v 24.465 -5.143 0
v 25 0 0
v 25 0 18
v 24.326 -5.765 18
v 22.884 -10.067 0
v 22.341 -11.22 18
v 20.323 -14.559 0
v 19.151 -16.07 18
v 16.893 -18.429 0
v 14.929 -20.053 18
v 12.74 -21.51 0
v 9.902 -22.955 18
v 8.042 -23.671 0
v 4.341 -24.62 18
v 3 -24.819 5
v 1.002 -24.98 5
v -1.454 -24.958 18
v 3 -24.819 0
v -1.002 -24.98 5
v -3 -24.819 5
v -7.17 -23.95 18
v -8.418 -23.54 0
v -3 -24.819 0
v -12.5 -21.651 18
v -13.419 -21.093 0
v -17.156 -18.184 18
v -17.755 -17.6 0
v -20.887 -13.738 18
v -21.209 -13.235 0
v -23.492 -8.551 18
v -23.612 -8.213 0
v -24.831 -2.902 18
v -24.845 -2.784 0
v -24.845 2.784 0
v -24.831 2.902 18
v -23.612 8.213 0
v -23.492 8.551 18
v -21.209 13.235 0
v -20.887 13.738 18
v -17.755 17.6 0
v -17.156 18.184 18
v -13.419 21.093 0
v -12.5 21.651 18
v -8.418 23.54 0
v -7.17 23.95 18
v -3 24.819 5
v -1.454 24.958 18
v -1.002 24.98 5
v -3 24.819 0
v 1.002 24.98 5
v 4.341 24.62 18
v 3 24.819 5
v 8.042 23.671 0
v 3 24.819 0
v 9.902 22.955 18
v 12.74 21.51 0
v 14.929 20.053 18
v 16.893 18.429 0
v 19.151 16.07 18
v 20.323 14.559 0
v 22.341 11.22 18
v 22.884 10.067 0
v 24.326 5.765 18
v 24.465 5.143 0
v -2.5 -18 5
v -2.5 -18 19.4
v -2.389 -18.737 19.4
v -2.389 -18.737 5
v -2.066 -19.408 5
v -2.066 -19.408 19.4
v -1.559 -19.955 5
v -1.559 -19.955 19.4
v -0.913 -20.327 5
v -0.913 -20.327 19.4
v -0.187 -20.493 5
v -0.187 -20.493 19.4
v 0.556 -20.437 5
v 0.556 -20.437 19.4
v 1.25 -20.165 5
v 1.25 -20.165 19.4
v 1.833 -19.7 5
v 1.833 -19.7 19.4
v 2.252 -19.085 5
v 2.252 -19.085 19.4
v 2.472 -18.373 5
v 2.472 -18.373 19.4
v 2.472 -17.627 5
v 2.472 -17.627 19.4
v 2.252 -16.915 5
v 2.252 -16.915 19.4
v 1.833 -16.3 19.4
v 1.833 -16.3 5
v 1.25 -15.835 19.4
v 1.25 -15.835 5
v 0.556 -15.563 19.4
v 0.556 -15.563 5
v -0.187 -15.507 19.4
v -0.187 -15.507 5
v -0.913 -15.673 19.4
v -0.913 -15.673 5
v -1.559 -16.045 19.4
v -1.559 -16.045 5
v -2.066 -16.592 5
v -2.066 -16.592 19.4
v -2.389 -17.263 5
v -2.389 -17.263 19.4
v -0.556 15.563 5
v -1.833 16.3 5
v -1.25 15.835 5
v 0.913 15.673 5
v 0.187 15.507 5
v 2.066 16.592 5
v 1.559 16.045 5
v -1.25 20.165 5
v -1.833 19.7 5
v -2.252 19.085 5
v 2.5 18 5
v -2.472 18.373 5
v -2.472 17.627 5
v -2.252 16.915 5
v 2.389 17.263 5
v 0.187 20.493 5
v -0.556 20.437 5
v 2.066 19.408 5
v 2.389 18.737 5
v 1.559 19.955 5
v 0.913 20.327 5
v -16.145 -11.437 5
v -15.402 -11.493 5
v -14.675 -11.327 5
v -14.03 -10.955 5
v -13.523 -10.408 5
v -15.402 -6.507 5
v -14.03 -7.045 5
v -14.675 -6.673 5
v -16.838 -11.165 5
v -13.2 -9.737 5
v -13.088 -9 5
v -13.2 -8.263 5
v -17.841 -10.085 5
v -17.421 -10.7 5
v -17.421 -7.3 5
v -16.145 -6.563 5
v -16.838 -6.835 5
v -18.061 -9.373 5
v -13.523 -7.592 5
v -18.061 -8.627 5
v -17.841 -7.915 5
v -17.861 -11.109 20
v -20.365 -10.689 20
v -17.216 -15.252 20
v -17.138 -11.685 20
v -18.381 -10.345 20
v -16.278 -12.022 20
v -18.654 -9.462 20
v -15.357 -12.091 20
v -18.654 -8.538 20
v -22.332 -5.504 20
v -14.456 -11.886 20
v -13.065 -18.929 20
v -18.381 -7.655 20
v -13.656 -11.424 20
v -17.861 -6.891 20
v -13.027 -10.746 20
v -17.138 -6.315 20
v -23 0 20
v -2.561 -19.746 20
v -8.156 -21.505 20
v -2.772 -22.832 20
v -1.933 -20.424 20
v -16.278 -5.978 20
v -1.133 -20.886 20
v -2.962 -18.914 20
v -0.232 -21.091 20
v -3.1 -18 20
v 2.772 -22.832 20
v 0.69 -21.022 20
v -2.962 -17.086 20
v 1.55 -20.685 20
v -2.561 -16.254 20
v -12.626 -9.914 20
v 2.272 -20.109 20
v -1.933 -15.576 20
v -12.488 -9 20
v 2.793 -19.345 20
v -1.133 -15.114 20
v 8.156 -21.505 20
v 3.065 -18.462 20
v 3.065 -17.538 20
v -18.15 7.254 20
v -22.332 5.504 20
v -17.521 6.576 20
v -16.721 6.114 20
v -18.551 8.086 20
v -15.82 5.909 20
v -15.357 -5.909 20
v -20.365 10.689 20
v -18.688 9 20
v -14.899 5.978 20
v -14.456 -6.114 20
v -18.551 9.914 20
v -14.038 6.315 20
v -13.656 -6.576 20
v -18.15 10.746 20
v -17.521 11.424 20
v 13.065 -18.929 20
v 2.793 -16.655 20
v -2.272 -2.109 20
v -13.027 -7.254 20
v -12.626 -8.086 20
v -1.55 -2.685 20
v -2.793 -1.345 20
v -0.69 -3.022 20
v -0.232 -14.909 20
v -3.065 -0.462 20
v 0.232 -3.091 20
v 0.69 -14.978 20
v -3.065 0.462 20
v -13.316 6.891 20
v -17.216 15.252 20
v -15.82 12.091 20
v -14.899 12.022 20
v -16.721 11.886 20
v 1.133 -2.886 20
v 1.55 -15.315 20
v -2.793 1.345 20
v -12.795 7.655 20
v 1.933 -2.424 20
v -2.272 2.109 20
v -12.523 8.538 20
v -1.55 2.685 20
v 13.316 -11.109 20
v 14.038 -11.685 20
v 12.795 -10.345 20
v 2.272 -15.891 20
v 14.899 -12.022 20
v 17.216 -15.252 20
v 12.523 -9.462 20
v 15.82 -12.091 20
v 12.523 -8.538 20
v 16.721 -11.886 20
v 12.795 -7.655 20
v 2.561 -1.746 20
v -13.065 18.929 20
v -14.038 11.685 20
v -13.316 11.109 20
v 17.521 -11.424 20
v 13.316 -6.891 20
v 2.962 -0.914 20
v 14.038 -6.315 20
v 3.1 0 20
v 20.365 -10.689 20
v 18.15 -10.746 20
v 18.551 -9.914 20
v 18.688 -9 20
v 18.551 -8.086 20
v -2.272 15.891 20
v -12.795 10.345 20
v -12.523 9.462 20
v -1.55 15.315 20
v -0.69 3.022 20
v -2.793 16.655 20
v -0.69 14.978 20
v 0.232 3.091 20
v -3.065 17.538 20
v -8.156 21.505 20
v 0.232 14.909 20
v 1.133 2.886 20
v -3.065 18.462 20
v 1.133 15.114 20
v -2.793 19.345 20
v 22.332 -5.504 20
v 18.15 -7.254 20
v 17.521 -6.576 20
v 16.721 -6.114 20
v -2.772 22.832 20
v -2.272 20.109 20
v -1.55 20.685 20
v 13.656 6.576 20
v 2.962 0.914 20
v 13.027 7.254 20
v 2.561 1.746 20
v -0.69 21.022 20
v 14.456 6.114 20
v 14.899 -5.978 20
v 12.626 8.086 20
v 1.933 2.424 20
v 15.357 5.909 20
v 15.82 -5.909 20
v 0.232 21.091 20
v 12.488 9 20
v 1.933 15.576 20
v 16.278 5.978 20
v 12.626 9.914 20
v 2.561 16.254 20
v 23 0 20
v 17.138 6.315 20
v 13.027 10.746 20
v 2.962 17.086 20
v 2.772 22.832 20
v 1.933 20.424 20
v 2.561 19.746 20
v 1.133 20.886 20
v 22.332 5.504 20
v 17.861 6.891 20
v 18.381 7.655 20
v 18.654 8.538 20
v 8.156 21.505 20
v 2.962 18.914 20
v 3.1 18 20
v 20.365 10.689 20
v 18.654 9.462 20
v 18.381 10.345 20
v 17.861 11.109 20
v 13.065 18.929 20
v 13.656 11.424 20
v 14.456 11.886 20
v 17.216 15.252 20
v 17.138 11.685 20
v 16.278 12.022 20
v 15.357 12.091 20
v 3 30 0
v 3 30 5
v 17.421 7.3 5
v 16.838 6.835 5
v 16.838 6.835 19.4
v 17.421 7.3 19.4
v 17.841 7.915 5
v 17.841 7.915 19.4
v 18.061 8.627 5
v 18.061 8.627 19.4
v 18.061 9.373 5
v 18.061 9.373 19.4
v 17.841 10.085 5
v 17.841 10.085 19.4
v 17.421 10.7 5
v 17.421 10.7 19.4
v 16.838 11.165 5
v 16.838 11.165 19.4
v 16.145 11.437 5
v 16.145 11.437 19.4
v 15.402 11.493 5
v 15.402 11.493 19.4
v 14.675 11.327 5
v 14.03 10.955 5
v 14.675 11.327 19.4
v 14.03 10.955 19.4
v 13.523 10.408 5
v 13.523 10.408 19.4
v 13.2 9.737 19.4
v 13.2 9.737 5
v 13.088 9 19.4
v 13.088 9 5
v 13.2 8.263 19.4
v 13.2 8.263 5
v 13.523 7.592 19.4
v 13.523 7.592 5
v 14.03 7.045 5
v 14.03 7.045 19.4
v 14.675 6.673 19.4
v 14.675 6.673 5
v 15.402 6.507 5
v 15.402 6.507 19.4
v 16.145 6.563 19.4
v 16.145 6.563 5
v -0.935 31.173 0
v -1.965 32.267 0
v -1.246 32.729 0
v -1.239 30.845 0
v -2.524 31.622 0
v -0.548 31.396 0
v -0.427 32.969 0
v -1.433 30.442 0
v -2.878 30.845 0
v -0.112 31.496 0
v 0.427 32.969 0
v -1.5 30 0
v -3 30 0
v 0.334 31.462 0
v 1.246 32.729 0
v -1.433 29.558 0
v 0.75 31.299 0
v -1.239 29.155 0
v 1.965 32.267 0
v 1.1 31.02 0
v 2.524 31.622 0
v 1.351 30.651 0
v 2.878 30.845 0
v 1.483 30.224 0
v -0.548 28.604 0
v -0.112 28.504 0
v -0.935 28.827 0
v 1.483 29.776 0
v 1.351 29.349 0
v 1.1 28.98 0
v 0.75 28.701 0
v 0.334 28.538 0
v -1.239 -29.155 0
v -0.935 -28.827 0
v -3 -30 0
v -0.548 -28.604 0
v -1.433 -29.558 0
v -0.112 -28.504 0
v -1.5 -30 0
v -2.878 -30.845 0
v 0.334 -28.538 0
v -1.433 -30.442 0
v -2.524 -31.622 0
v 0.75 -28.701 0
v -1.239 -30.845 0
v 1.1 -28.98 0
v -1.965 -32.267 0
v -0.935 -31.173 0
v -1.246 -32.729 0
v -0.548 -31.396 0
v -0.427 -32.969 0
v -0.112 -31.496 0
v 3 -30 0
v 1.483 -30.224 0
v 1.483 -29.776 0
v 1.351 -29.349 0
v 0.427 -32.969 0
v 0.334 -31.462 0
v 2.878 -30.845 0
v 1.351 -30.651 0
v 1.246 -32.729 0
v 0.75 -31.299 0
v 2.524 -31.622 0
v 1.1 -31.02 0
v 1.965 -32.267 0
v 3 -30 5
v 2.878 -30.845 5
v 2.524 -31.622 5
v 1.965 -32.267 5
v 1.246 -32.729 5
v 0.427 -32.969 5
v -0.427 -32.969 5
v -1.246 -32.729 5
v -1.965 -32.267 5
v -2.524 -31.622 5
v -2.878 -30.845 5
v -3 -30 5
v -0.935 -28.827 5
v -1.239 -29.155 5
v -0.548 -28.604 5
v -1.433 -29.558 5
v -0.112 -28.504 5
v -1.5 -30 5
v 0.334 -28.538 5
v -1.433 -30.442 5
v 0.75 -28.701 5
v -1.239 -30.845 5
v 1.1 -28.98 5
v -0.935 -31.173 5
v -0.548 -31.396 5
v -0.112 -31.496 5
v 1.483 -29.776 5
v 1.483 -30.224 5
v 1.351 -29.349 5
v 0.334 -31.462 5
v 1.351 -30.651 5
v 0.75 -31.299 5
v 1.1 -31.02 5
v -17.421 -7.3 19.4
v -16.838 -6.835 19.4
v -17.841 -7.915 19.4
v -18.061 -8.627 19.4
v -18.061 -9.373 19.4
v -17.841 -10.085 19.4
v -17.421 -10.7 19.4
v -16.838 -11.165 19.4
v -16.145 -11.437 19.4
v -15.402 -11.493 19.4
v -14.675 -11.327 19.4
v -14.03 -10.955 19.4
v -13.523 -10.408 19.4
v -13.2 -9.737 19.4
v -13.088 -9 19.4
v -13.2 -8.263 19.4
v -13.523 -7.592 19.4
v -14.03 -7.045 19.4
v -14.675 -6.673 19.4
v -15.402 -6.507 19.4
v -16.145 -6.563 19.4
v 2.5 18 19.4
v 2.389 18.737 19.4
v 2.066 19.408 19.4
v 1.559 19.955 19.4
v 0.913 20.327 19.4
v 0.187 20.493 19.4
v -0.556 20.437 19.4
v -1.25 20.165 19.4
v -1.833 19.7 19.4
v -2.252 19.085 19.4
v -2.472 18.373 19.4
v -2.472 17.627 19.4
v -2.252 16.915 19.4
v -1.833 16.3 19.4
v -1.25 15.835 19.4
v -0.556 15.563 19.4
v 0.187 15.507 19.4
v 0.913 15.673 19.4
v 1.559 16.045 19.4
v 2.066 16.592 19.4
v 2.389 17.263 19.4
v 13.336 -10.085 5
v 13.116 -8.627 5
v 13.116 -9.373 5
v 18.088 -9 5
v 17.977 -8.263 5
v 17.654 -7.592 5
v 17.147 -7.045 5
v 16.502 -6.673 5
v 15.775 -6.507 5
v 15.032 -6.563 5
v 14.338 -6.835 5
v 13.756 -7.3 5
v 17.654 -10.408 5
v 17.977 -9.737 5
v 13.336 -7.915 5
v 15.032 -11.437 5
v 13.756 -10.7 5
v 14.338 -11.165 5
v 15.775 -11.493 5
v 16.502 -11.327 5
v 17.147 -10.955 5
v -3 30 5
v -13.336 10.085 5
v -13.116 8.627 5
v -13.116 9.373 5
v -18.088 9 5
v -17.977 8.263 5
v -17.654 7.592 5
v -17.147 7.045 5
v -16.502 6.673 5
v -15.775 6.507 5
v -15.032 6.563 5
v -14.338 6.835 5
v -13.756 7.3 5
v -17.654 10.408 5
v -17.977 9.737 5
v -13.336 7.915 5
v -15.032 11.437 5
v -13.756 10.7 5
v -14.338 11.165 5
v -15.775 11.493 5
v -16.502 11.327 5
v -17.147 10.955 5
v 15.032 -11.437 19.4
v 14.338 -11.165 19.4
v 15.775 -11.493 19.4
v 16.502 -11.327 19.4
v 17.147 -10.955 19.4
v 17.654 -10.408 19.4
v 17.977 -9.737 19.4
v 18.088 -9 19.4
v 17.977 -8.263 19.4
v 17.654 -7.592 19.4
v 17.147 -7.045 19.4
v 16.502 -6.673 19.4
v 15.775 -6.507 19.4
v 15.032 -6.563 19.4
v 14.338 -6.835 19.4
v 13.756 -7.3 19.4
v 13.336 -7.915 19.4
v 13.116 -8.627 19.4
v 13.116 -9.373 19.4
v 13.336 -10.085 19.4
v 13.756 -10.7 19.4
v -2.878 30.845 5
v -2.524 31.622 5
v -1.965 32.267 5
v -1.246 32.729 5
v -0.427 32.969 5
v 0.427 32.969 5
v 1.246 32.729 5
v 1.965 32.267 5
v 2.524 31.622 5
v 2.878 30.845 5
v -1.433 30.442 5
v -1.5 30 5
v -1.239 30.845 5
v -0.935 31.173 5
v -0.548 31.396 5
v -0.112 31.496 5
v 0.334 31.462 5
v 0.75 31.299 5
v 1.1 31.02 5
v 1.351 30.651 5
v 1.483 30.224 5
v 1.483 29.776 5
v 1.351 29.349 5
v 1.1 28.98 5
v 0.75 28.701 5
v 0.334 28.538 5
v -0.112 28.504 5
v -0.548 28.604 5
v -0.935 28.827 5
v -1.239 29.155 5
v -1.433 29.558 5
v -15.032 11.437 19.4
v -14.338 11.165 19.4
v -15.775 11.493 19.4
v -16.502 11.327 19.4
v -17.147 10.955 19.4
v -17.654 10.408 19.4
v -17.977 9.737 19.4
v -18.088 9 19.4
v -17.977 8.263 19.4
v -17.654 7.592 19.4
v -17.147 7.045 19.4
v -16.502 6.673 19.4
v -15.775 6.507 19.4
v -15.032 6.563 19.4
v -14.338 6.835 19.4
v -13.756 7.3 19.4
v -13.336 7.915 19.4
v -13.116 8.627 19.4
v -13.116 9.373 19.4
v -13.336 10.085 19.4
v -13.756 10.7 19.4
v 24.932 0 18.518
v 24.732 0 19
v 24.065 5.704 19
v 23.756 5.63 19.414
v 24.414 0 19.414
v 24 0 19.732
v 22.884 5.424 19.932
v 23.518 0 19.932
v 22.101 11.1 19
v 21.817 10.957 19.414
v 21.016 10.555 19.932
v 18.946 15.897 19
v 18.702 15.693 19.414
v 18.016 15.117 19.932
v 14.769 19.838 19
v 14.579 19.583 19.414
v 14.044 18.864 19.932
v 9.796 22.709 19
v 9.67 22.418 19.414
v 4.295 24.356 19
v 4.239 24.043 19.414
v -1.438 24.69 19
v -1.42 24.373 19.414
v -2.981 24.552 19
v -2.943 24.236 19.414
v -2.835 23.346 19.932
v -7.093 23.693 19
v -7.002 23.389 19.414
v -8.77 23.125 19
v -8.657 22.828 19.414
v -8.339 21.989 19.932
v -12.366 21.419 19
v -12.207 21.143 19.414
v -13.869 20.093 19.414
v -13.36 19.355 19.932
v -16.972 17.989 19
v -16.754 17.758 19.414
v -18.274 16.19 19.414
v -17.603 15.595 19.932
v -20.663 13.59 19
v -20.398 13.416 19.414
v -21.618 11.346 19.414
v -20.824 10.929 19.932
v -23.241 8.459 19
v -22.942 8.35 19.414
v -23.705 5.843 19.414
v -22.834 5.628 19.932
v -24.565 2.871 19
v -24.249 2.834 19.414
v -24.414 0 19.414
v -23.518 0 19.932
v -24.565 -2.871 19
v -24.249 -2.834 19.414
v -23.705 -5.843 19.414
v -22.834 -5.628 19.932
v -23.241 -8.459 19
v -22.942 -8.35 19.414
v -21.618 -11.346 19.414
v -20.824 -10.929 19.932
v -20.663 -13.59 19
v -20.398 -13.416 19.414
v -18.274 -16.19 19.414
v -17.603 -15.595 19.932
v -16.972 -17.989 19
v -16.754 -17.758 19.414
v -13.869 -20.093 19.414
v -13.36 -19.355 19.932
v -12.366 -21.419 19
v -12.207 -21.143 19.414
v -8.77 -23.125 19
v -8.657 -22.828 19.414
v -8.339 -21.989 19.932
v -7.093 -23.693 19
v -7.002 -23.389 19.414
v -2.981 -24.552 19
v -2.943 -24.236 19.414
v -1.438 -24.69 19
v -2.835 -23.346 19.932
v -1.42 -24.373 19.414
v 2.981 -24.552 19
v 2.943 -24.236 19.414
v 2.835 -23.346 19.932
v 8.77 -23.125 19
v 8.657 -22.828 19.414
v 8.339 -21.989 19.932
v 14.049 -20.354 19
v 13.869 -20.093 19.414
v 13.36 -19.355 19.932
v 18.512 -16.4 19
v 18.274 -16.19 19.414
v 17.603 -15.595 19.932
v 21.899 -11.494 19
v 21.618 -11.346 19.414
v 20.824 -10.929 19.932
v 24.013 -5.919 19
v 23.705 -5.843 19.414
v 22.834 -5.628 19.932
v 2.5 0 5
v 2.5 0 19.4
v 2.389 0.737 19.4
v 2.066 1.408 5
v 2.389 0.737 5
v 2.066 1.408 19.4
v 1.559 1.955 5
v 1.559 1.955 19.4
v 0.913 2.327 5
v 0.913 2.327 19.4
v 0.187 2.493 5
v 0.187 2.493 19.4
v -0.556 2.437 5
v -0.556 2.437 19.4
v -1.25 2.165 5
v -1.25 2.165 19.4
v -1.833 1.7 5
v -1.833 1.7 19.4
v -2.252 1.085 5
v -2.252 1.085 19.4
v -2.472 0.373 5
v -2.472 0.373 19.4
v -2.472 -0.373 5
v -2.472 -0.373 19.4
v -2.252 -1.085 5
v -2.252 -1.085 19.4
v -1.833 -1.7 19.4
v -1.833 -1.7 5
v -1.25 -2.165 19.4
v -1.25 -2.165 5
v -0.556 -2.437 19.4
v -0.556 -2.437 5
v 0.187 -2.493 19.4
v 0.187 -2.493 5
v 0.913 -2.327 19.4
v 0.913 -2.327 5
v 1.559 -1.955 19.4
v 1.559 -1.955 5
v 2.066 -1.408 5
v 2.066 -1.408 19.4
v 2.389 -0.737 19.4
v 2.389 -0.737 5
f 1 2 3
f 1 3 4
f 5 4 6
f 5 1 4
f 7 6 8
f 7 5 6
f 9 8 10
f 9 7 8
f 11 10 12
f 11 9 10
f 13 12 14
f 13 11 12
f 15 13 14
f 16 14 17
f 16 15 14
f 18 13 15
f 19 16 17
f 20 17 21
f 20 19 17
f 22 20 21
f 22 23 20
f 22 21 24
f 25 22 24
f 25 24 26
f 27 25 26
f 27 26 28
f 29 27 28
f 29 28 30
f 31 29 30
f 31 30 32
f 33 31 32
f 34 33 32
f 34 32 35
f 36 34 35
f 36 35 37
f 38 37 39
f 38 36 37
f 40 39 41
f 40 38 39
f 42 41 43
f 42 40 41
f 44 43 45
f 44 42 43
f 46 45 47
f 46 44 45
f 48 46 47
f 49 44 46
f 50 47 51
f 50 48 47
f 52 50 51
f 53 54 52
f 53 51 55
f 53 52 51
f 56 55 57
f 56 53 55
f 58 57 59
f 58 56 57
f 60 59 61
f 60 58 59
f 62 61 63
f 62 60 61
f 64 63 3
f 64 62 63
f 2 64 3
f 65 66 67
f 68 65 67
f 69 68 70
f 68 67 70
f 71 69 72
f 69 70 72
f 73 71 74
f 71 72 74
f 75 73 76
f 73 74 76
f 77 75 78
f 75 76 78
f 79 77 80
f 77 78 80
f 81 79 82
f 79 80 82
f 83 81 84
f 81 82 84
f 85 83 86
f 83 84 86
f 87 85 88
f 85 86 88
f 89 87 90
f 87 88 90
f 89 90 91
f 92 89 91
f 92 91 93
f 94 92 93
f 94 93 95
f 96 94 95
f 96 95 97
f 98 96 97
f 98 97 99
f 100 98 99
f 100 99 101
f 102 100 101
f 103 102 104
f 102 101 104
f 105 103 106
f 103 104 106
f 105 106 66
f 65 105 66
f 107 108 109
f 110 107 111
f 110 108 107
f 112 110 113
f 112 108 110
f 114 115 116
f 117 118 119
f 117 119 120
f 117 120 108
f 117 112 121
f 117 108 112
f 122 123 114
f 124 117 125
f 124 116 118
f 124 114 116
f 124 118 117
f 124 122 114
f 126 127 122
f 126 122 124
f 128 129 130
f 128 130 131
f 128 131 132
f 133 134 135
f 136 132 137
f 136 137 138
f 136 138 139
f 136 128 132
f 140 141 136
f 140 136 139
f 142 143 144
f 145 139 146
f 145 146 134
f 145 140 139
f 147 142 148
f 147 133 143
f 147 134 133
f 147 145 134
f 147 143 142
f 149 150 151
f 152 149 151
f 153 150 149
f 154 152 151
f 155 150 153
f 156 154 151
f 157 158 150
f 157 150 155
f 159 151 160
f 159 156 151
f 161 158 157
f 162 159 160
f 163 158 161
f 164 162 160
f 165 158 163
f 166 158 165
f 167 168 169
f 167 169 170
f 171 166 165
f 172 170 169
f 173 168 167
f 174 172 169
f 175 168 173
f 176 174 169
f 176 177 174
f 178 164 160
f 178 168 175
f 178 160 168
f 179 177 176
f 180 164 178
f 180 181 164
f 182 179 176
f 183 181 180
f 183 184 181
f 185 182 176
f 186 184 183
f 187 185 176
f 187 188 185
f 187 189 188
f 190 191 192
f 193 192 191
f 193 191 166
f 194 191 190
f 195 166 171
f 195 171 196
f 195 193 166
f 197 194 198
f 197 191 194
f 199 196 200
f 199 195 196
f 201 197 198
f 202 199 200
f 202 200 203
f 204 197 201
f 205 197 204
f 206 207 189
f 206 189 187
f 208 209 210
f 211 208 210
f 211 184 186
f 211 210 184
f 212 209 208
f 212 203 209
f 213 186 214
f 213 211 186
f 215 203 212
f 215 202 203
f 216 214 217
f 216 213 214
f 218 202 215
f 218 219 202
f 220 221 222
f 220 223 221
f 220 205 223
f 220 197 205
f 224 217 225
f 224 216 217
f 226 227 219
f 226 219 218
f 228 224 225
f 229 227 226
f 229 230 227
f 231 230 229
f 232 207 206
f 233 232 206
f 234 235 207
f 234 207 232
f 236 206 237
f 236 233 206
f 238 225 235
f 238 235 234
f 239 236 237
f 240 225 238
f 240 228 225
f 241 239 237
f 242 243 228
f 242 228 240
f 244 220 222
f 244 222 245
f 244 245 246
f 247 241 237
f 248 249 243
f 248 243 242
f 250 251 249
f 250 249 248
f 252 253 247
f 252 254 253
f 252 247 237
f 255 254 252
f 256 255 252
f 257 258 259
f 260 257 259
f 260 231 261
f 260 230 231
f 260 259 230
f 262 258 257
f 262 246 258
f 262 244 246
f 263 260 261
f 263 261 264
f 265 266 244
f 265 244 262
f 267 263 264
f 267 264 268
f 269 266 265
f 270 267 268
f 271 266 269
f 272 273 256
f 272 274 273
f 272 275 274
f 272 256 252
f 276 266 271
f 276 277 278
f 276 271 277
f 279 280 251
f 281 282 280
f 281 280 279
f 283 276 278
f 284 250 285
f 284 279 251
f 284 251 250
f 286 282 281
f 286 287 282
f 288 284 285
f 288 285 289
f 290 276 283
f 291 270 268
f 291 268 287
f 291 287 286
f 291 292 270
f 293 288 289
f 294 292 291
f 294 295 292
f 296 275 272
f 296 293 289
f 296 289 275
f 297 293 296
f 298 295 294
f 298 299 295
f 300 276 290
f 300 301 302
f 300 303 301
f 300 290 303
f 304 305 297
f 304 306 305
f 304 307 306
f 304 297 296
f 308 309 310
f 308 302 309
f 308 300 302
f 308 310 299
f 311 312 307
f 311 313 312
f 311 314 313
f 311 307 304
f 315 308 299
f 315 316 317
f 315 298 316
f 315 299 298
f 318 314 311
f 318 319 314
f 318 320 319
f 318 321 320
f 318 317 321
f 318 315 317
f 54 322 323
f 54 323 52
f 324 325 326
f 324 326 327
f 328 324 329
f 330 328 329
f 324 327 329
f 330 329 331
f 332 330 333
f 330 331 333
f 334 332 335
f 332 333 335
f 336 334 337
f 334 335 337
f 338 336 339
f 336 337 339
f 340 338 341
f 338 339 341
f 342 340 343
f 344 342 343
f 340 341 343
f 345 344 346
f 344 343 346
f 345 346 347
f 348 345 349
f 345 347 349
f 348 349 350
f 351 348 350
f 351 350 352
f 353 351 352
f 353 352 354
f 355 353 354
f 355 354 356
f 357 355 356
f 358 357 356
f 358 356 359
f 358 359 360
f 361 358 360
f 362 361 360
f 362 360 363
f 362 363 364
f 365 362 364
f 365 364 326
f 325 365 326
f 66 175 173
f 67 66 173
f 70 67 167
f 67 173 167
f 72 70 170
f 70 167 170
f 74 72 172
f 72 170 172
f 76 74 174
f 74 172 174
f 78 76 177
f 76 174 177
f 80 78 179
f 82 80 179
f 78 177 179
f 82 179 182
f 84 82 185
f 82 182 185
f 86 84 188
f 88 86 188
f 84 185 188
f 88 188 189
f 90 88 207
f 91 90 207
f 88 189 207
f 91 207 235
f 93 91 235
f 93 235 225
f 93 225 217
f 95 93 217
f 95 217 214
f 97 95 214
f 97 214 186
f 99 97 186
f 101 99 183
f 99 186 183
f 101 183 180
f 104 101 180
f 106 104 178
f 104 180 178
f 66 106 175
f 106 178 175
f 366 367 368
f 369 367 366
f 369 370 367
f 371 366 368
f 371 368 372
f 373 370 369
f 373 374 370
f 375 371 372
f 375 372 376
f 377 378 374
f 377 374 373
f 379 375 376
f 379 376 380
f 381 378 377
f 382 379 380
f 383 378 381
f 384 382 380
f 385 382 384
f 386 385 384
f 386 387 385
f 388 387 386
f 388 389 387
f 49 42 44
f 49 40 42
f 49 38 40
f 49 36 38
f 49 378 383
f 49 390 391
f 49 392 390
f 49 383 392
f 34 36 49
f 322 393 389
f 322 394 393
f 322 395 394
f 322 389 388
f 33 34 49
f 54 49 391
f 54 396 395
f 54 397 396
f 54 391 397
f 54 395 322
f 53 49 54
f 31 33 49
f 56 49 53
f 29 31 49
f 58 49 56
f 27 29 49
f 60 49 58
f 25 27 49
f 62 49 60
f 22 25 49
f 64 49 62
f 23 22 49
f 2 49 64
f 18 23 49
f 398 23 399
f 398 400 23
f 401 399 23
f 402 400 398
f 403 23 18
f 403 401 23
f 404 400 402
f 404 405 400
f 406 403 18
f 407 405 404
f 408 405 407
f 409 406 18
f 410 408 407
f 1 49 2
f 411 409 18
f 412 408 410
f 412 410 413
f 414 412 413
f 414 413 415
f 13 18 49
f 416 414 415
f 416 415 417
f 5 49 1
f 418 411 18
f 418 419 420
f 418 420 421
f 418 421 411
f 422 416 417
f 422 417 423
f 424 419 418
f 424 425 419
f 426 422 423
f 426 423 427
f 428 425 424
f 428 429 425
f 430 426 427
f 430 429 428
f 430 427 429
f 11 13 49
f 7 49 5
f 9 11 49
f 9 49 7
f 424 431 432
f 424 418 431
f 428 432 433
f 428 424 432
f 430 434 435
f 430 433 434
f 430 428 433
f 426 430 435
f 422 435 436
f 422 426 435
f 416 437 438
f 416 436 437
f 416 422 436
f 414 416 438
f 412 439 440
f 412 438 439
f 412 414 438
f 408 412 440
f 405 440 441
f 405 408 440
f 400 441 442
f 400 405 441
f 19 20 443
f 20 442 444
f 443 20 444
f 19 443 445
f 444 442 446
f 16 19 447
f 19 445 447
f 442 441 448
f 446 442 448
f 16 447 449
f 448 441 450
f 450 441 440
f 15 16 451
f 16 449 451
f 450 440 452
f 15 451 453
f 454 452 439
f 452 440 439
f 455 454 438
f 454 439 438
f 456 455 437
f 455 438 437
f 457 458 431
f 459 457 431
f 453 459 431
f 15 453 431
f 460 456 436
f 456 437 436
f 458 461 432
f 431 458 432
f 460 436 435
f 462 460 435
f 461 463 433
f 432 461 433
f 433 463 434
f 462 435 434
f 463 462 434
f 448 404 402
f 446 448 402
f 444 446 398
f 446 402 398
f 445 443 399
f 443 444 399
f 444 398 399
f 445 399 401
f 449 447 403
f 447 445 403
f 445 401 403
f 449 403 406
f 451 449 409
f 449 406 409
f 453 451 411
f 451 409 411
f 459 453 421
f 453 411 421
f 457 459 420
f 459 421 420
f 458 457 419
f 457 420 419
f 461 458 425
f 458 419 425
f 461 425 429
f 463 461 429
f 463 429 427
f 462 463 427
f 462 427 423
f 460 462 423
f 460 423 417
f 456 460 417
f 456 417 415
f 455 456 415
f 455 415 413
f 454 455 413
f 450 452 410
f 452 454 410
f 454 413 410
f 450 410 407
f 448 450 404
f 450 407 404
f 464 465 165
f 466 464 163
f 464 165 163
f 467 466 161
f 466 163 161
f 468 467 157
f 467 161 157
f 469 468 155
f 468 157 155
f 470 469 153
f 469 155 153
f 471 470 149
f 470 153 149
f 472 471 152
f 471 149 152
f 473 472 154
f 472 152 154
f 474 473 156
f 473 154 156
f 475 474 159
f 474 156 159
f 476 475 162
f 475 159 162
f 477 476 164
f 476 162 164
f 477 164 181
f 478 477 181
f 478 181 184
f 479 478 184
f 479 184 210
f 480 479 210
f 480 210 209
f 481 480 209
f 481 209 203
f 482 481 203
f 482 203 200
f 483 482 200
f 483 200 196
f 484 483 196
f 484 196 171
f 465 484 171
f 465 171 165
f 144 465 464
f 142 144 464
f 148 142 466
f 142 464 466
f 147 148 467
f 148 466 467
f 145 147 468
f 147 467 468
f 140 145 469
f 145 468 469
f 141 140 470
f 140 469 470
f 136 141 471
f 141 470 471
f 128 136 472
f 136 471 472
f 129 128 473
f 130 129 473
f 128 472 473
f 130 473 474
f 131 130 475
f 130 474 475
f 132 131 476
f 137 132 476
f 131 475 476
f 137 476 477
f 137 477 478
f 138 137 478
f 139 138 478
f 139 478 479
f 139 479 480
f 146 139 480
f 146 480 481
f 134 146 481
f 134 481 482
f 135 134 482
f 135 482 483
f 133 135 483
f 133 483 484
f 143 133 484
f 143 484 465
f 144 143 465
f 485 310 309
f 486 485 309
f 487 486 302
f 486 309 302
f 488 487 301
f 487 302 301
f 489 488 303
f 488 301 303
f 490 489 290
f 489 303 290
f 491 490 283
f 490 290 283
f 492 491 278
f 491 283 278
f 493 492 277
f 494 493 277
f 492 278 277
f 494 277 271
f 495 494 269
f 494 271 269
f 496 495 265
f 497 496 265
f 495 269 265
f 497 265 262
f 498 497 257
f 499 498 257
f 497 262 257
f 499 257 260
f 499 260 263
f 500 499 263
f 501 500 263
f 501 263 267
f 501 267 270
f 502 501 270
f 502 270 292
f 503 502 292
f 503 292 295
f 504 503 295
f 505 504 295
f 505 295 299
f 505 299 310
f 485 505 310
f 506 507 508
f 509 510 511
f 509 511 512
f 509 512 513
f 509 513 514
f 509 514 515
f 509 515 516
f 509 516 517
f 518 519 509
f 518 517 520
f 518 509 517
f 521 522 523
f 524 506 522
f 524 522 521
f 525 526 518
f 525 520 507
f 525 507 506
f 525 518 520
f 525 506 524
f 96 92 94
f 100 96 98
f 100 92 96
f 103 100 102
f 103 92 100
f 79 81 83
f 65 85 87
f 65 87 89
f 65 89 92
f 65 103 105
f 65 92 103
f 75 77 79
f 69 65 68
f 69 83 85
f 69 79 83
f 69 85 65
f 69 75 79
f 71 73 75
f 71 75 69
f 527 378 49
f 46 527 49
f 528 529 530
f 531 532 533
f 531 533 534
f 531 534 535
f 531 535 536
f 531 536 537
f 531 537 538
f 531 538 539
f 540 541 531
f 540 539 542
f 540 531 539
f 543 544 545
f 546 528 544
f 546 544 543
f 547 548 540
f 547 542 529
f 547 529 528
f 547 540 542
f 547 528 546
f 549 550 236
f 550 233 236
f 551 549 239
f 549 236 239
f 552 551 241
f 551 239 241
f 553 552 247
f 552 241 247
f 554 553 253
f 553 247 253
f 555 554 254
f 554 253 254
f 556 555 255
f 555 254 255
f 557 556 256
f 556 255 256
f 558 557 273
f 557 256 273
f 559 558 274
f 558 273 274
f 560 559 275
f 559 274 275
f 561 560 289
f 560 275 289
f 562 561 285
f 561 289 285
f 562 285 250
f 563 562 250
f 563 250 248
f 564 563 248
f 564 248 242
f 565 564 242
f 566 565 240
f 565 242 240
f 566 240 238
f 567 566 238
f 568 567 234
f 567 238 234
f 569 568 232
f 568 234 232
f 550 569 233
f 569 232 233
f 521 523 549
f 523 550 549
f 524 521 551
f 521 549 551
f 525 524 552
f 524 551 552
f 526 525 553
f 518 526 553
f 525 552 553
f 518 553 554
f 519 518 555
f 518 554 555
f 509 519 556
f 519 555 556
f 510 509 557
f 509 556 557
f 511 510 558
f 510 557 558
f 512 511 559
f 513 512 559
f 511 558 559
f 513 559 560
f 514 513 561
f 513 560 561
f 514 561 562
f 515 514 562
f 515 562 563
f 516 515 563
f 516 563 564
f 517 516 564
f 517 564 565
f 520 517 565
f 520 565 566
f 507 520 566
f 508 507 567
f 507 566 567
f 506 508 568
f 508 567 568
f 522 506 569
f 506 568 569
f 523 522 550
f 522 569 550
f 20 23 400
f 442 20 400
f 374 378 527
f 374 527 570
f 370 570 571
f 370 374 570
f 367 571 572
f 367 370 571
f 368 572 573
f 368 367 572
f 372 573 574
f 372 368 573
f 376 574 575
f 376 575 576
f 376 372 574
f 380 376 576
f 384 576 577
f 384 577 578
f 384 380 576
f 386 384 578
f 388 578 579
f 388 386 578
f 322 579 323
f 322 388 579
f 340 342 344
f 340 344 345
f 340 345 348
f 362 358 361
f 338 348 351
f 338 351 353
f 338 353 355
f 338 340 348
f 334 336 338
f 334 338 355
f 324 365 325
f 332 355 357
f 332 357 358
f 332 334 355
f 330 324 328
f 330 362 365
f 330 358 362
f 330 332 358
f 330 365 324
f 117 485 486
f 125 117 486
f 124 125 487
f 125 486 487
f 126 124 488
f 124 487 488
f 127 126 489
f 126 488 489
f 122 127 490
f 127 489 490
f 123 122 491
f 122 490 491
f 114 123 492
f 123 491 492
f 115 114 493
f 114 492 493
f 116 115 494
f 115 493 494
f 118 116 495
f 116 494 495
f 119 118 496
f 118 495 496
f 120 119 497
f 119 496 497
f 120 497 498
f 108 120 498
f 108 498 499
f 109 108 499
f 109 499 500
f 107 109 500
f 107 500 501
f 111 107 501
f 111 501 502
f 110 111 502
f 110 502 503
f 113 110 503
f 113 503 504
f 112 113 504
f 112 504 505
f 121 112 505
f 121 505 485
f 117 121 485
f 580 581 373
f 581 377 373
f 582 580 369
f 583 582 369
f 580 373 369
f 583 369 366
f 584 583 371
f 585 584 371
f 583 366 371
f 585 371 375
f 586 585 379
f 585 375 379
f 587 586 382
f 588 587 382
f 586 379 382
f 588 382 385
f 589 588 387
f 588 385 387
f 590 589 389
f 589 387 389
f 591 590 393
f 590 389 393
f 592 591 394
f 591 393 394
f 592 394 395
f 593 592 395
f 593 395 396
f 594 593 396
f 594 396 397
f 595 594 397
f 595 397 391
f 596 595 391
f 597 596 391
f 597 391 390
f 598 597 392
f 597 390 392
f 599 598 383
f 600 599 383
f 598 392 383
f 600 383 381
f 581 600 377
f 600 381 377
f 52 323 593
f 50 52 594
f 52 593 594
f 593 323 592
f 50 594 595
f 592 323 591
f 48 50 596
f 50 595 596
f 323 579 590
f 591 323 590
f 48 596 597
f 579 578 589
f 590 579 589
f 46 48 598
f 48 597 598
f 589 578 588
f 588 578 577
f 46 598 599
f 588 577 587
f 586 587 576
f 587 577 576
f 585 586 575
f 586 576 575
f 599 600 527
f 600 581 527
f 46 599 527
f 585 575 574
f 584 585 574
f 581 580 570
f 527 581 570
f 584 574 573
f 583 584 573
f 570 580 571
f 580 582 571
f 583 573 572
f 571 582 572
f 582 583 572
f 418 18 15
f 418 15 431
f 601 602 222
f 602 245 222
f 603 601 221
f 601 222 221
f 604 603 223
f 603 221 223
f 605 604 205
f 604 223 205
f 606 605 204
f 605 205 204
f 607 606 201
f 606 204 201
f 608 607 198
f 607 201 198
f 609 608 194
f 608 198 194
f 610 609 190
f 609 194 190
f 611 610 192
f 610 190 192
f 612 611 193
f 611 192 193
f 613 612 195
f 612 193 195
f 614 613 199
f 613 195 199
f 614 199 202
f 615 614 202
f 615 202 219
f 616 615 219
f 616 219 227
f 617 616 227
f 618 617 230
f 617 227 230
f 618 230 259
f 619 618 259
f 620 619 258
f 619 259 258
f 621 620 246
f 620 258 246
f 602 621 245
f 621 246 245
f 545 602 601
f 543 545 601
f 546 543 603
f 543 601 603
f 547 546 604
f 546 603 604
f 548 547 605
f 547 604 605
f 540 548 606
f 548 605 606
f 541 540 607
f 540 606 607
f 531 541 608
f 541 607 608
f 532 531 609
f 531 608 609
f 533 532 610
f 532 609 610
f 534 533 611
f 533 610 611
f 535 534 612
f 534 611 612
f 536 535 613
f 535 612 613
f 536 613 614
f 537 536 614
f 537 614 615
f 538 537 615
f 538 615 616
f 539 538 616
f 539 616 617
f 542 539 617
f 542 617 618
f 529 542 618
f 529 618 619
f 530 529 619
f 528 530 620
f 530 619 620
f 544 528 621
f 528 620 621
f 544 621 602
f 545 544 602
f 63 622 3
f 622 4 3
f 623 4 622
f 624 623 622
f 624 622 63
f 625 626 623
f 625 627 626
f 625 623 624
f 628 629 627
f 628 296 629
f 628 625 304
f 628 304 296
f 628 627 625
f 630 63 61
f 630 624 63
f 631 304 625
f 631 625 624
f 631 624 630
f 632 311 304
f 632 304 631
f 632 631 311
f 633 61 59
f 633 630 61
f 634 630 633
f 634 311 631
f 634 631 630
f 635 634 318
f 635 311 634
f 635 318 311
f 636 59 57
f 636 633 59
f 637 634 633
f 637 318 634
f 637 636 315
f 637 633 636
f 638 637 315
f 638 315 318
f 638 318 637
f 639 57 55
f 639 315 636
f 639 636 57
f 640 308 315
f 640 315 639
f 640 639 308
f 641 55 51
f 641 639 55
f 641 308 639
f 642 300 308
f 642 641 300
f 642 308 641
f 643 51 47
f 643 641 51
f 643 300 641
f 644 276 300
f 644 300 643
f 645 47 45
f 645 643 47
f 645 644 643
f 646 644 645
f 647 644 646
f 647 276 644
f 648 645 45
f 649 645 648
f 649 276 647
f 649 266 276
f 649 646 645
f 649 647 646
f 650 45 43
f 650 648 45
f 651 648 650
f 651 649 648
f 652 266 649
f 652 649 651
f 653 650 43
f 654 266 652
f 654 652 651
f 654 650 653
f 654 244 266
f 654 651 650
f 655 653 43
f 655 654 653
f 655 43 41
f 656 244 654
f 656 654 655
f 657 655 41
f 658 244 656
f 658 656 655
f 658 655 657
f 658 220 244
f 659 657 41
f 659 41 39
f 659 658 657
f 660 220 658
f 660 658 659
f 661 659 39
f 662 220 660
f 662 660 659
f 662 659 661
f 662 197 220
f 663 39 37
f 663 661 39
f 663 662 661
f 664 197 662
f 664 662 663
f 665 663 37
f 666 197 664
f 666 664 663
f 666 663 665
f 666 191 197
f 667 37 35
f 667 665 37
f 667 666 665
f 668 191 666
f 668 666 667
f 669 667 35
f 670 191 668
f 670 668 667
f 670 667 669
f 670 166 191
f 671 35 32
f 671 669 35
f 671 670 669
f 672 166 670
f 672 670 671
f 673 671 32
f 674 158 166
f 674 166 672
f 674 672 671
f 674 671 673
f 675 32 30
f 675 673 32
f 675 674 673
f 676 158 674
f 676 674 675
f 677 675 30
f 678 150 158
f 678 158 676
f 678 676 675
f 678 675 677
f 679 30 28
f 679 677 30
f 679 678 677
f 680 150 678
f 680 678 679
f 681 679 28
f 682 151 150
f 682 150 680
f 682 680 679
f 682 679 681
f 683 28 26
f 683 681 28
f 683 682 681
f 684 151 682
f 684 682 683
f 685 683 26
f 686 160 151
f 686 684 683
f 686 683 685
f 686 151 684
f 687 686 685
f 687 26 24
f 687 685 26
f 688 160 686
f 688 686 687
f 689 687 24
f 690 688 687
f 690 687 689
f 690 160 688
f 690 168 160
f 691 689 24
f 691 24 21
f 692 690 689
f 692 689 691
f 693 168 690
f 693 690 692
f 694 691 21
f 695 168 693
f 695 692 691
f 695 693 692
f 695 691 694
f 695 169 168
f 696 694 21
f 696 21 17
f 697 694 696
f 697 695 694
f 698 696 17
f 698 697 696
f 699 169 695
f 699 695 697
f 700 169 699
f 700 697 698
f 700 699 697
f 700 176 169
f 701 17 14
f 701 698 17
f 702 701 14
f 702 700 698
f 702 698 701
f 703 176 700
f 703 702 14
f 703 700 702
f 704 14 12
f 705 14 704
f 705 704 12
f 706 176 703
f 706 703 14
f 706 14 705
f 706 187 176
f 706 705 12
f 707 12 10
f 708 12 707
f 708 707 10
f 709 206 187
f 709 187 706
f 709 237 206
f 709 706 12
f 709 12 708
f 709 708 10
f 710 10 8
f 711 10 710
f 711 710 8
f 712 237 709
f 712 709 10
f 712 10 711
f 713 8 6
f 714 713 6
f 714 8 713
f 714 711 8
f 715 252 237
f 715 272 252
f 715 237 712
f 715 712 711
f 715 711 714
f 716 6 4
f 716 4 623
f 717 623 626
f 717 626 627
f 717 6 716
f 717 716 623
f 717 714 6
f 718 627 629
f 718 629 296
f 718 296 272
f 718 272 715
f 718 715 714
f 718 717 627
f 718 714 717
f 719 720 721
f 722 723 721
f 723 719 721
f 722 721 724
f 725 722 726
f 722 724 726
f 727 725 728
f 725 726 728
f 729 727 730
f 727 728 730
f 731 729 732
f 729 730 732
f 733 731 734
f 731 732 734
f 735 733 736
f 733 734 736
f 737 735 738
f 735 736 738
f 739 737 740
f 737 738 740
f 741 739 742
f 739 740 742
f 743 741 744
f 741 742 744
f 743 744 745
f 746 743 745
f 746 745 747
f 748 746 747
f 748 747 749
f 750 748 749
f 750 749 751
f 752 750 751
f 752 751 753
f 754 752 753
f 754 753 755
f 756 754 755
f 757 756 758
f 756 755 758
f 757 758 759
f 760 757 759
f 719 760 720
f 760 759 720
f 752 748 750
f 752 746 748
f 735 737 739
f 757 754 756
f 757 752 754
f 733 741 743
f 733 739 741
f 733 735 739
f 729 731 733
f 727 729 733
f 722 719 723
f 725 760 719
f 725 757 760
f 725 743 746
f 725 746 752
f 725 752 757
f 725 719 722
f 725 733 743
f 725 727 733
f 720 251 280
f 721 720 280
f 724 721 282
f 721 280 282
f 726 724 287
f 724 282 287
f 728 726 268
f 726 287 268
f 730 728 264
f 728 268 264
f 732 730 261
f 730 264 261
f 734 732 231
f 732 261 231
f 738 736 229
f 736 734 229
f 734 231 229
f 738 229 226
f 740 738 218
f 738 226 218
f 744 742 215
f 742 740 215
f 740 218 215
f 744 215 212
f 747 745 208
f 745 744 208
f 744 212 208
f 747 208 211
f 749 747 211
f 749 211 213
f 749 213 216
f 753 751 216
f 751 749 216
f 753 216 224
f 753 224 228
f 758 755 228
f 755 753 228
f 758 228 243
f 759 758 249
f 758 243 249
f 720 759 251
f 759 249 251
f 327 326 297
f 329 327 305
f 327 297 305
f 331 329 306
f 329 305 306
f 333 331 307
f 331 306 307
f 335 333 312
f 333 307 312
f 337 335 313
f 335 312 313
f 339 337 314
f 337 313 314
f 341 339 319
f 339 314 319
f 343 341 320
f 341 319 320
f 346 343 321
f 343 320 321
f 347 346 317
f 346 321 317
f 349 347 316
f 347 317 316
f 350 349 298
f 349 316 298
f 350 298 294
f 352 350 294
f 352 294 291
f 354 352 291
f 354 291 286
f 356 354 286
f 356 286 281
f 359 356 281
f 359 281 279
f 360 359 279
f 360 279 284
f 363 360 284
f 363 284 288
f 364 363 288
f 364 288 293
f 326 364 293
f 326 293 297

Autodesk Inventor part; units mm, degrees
ref_plane "YZ Plane" through (0, 0, 0) normal (1, 0, 0) x (0, 1, 0)
ref_plane "XZ Plane" through (0, 0, 0) normal (0, 1, 0) x (-1, 0, 0)
ref_plane "XY Plane" through (0, 0, 0) normal (0, 0, 1) x (1, 0, 0)
sketch "Esboço1" plane through (0, 0, 0) normal (0, 0, 1) x (1, 0, 0)
  circle A0 centre (0, 0) radius 25
  dimension "d0" = 50
extrude "Extrusão1" add sketch "Esboço1" along normal blind 20
fillet "Arredondamento1" radius 2 1 edges at (-25, 0, 20)
sketch "Esboço2" plane through (0, 0, 20) normal (0, 0, 1) x (1, 0, 0)
  circle A0 centre (0, 0) radius 2.5
  circle A1 centre (0, 18) radius 2.5
  dimension "d4" = 5
  dimension "d5" = 5
  dimension "d6" = 18
extrude "Extrusão2" cut sketch "Esboço2" against normal blind 15
chamfer "Chanfro1" distance 0.6 angle 45 2 edges at (-2.5, 0, 20) (-2.5, 18, 20)
pattern_circular "Padrão circular1" count 6 over 360 about axis through (0, 0, 0) along (0, 0, 1) of "Extrusão2", "Chanfro1"
sketch "Esboço3" plane through (0, 0, 0) normal (0, 0, -1) x (-1, 0, 0)
  arc A0 (3, 30) -> (-3, 30) centre (0, 30) ccw
  circle A1 centre (0, 30) radius 1.5
  line L0 (3, 30) -> (3, 24.3841)
  line L1 (-3, 30) -> (-3, 24.3841)
  line L2 (-3, 24.3841) -> (3, 24.3841)
  point P0 (0, 0)
  dimension "d15" = 6
  dimension "d16" = 3
  dimension "d17" = 30
extrude "Extrusão3" add sketch "Esboço3" against normal blind 5
mirror "Espelhamento1" about plane through (0, 0, 0) normal (0, 1, 0) of "Extrusão3"
sketch "Esboço4" plane through (0, 0, 20) normal (0, 0, 1) x (1, 0, 0)
  circle A0 centre (0, 0) radius 3.1 projected
sketch "Esboço5" plane through (0, 0, 20) normal (0, 0, 1) x (1, 0, 0)
  circle A0 centre (0, 18) radius 3.1 projected
sketch "Esboço6" plane through (0, 0, 20) normal (0, 0, 1) x (1, 0, 0)
  circle A0 centre (15.5885, 9) radius 3.1 projected
sketch "Esboço7" plane through (0, 0, 20) normal (0, 0, 1) x (1, 0, 0)
  circle A0 centre (15.5885, -9) radius 3.1 projected
sketch "Esboço8" plane through (0, 0, 20) normal (0, 0, 1) x (1, 0, 0)
  circle A0 centre (0, -18) radius 3.1 projected
sketch "Esboço9" plane through (0, 0, 20) normal (0, 0, 1) x (1, 0, 0)
  circle A0 centre (-15.5885, -9) radius 3.1 projected
sketch "Esboço10" plane through (0, 0, 20) normal (0, 0, 1) x (1, 0, 0)
  circle A0 centre (-15.5885, 9) radius 3.1 projected
properties part number "Conector2"
